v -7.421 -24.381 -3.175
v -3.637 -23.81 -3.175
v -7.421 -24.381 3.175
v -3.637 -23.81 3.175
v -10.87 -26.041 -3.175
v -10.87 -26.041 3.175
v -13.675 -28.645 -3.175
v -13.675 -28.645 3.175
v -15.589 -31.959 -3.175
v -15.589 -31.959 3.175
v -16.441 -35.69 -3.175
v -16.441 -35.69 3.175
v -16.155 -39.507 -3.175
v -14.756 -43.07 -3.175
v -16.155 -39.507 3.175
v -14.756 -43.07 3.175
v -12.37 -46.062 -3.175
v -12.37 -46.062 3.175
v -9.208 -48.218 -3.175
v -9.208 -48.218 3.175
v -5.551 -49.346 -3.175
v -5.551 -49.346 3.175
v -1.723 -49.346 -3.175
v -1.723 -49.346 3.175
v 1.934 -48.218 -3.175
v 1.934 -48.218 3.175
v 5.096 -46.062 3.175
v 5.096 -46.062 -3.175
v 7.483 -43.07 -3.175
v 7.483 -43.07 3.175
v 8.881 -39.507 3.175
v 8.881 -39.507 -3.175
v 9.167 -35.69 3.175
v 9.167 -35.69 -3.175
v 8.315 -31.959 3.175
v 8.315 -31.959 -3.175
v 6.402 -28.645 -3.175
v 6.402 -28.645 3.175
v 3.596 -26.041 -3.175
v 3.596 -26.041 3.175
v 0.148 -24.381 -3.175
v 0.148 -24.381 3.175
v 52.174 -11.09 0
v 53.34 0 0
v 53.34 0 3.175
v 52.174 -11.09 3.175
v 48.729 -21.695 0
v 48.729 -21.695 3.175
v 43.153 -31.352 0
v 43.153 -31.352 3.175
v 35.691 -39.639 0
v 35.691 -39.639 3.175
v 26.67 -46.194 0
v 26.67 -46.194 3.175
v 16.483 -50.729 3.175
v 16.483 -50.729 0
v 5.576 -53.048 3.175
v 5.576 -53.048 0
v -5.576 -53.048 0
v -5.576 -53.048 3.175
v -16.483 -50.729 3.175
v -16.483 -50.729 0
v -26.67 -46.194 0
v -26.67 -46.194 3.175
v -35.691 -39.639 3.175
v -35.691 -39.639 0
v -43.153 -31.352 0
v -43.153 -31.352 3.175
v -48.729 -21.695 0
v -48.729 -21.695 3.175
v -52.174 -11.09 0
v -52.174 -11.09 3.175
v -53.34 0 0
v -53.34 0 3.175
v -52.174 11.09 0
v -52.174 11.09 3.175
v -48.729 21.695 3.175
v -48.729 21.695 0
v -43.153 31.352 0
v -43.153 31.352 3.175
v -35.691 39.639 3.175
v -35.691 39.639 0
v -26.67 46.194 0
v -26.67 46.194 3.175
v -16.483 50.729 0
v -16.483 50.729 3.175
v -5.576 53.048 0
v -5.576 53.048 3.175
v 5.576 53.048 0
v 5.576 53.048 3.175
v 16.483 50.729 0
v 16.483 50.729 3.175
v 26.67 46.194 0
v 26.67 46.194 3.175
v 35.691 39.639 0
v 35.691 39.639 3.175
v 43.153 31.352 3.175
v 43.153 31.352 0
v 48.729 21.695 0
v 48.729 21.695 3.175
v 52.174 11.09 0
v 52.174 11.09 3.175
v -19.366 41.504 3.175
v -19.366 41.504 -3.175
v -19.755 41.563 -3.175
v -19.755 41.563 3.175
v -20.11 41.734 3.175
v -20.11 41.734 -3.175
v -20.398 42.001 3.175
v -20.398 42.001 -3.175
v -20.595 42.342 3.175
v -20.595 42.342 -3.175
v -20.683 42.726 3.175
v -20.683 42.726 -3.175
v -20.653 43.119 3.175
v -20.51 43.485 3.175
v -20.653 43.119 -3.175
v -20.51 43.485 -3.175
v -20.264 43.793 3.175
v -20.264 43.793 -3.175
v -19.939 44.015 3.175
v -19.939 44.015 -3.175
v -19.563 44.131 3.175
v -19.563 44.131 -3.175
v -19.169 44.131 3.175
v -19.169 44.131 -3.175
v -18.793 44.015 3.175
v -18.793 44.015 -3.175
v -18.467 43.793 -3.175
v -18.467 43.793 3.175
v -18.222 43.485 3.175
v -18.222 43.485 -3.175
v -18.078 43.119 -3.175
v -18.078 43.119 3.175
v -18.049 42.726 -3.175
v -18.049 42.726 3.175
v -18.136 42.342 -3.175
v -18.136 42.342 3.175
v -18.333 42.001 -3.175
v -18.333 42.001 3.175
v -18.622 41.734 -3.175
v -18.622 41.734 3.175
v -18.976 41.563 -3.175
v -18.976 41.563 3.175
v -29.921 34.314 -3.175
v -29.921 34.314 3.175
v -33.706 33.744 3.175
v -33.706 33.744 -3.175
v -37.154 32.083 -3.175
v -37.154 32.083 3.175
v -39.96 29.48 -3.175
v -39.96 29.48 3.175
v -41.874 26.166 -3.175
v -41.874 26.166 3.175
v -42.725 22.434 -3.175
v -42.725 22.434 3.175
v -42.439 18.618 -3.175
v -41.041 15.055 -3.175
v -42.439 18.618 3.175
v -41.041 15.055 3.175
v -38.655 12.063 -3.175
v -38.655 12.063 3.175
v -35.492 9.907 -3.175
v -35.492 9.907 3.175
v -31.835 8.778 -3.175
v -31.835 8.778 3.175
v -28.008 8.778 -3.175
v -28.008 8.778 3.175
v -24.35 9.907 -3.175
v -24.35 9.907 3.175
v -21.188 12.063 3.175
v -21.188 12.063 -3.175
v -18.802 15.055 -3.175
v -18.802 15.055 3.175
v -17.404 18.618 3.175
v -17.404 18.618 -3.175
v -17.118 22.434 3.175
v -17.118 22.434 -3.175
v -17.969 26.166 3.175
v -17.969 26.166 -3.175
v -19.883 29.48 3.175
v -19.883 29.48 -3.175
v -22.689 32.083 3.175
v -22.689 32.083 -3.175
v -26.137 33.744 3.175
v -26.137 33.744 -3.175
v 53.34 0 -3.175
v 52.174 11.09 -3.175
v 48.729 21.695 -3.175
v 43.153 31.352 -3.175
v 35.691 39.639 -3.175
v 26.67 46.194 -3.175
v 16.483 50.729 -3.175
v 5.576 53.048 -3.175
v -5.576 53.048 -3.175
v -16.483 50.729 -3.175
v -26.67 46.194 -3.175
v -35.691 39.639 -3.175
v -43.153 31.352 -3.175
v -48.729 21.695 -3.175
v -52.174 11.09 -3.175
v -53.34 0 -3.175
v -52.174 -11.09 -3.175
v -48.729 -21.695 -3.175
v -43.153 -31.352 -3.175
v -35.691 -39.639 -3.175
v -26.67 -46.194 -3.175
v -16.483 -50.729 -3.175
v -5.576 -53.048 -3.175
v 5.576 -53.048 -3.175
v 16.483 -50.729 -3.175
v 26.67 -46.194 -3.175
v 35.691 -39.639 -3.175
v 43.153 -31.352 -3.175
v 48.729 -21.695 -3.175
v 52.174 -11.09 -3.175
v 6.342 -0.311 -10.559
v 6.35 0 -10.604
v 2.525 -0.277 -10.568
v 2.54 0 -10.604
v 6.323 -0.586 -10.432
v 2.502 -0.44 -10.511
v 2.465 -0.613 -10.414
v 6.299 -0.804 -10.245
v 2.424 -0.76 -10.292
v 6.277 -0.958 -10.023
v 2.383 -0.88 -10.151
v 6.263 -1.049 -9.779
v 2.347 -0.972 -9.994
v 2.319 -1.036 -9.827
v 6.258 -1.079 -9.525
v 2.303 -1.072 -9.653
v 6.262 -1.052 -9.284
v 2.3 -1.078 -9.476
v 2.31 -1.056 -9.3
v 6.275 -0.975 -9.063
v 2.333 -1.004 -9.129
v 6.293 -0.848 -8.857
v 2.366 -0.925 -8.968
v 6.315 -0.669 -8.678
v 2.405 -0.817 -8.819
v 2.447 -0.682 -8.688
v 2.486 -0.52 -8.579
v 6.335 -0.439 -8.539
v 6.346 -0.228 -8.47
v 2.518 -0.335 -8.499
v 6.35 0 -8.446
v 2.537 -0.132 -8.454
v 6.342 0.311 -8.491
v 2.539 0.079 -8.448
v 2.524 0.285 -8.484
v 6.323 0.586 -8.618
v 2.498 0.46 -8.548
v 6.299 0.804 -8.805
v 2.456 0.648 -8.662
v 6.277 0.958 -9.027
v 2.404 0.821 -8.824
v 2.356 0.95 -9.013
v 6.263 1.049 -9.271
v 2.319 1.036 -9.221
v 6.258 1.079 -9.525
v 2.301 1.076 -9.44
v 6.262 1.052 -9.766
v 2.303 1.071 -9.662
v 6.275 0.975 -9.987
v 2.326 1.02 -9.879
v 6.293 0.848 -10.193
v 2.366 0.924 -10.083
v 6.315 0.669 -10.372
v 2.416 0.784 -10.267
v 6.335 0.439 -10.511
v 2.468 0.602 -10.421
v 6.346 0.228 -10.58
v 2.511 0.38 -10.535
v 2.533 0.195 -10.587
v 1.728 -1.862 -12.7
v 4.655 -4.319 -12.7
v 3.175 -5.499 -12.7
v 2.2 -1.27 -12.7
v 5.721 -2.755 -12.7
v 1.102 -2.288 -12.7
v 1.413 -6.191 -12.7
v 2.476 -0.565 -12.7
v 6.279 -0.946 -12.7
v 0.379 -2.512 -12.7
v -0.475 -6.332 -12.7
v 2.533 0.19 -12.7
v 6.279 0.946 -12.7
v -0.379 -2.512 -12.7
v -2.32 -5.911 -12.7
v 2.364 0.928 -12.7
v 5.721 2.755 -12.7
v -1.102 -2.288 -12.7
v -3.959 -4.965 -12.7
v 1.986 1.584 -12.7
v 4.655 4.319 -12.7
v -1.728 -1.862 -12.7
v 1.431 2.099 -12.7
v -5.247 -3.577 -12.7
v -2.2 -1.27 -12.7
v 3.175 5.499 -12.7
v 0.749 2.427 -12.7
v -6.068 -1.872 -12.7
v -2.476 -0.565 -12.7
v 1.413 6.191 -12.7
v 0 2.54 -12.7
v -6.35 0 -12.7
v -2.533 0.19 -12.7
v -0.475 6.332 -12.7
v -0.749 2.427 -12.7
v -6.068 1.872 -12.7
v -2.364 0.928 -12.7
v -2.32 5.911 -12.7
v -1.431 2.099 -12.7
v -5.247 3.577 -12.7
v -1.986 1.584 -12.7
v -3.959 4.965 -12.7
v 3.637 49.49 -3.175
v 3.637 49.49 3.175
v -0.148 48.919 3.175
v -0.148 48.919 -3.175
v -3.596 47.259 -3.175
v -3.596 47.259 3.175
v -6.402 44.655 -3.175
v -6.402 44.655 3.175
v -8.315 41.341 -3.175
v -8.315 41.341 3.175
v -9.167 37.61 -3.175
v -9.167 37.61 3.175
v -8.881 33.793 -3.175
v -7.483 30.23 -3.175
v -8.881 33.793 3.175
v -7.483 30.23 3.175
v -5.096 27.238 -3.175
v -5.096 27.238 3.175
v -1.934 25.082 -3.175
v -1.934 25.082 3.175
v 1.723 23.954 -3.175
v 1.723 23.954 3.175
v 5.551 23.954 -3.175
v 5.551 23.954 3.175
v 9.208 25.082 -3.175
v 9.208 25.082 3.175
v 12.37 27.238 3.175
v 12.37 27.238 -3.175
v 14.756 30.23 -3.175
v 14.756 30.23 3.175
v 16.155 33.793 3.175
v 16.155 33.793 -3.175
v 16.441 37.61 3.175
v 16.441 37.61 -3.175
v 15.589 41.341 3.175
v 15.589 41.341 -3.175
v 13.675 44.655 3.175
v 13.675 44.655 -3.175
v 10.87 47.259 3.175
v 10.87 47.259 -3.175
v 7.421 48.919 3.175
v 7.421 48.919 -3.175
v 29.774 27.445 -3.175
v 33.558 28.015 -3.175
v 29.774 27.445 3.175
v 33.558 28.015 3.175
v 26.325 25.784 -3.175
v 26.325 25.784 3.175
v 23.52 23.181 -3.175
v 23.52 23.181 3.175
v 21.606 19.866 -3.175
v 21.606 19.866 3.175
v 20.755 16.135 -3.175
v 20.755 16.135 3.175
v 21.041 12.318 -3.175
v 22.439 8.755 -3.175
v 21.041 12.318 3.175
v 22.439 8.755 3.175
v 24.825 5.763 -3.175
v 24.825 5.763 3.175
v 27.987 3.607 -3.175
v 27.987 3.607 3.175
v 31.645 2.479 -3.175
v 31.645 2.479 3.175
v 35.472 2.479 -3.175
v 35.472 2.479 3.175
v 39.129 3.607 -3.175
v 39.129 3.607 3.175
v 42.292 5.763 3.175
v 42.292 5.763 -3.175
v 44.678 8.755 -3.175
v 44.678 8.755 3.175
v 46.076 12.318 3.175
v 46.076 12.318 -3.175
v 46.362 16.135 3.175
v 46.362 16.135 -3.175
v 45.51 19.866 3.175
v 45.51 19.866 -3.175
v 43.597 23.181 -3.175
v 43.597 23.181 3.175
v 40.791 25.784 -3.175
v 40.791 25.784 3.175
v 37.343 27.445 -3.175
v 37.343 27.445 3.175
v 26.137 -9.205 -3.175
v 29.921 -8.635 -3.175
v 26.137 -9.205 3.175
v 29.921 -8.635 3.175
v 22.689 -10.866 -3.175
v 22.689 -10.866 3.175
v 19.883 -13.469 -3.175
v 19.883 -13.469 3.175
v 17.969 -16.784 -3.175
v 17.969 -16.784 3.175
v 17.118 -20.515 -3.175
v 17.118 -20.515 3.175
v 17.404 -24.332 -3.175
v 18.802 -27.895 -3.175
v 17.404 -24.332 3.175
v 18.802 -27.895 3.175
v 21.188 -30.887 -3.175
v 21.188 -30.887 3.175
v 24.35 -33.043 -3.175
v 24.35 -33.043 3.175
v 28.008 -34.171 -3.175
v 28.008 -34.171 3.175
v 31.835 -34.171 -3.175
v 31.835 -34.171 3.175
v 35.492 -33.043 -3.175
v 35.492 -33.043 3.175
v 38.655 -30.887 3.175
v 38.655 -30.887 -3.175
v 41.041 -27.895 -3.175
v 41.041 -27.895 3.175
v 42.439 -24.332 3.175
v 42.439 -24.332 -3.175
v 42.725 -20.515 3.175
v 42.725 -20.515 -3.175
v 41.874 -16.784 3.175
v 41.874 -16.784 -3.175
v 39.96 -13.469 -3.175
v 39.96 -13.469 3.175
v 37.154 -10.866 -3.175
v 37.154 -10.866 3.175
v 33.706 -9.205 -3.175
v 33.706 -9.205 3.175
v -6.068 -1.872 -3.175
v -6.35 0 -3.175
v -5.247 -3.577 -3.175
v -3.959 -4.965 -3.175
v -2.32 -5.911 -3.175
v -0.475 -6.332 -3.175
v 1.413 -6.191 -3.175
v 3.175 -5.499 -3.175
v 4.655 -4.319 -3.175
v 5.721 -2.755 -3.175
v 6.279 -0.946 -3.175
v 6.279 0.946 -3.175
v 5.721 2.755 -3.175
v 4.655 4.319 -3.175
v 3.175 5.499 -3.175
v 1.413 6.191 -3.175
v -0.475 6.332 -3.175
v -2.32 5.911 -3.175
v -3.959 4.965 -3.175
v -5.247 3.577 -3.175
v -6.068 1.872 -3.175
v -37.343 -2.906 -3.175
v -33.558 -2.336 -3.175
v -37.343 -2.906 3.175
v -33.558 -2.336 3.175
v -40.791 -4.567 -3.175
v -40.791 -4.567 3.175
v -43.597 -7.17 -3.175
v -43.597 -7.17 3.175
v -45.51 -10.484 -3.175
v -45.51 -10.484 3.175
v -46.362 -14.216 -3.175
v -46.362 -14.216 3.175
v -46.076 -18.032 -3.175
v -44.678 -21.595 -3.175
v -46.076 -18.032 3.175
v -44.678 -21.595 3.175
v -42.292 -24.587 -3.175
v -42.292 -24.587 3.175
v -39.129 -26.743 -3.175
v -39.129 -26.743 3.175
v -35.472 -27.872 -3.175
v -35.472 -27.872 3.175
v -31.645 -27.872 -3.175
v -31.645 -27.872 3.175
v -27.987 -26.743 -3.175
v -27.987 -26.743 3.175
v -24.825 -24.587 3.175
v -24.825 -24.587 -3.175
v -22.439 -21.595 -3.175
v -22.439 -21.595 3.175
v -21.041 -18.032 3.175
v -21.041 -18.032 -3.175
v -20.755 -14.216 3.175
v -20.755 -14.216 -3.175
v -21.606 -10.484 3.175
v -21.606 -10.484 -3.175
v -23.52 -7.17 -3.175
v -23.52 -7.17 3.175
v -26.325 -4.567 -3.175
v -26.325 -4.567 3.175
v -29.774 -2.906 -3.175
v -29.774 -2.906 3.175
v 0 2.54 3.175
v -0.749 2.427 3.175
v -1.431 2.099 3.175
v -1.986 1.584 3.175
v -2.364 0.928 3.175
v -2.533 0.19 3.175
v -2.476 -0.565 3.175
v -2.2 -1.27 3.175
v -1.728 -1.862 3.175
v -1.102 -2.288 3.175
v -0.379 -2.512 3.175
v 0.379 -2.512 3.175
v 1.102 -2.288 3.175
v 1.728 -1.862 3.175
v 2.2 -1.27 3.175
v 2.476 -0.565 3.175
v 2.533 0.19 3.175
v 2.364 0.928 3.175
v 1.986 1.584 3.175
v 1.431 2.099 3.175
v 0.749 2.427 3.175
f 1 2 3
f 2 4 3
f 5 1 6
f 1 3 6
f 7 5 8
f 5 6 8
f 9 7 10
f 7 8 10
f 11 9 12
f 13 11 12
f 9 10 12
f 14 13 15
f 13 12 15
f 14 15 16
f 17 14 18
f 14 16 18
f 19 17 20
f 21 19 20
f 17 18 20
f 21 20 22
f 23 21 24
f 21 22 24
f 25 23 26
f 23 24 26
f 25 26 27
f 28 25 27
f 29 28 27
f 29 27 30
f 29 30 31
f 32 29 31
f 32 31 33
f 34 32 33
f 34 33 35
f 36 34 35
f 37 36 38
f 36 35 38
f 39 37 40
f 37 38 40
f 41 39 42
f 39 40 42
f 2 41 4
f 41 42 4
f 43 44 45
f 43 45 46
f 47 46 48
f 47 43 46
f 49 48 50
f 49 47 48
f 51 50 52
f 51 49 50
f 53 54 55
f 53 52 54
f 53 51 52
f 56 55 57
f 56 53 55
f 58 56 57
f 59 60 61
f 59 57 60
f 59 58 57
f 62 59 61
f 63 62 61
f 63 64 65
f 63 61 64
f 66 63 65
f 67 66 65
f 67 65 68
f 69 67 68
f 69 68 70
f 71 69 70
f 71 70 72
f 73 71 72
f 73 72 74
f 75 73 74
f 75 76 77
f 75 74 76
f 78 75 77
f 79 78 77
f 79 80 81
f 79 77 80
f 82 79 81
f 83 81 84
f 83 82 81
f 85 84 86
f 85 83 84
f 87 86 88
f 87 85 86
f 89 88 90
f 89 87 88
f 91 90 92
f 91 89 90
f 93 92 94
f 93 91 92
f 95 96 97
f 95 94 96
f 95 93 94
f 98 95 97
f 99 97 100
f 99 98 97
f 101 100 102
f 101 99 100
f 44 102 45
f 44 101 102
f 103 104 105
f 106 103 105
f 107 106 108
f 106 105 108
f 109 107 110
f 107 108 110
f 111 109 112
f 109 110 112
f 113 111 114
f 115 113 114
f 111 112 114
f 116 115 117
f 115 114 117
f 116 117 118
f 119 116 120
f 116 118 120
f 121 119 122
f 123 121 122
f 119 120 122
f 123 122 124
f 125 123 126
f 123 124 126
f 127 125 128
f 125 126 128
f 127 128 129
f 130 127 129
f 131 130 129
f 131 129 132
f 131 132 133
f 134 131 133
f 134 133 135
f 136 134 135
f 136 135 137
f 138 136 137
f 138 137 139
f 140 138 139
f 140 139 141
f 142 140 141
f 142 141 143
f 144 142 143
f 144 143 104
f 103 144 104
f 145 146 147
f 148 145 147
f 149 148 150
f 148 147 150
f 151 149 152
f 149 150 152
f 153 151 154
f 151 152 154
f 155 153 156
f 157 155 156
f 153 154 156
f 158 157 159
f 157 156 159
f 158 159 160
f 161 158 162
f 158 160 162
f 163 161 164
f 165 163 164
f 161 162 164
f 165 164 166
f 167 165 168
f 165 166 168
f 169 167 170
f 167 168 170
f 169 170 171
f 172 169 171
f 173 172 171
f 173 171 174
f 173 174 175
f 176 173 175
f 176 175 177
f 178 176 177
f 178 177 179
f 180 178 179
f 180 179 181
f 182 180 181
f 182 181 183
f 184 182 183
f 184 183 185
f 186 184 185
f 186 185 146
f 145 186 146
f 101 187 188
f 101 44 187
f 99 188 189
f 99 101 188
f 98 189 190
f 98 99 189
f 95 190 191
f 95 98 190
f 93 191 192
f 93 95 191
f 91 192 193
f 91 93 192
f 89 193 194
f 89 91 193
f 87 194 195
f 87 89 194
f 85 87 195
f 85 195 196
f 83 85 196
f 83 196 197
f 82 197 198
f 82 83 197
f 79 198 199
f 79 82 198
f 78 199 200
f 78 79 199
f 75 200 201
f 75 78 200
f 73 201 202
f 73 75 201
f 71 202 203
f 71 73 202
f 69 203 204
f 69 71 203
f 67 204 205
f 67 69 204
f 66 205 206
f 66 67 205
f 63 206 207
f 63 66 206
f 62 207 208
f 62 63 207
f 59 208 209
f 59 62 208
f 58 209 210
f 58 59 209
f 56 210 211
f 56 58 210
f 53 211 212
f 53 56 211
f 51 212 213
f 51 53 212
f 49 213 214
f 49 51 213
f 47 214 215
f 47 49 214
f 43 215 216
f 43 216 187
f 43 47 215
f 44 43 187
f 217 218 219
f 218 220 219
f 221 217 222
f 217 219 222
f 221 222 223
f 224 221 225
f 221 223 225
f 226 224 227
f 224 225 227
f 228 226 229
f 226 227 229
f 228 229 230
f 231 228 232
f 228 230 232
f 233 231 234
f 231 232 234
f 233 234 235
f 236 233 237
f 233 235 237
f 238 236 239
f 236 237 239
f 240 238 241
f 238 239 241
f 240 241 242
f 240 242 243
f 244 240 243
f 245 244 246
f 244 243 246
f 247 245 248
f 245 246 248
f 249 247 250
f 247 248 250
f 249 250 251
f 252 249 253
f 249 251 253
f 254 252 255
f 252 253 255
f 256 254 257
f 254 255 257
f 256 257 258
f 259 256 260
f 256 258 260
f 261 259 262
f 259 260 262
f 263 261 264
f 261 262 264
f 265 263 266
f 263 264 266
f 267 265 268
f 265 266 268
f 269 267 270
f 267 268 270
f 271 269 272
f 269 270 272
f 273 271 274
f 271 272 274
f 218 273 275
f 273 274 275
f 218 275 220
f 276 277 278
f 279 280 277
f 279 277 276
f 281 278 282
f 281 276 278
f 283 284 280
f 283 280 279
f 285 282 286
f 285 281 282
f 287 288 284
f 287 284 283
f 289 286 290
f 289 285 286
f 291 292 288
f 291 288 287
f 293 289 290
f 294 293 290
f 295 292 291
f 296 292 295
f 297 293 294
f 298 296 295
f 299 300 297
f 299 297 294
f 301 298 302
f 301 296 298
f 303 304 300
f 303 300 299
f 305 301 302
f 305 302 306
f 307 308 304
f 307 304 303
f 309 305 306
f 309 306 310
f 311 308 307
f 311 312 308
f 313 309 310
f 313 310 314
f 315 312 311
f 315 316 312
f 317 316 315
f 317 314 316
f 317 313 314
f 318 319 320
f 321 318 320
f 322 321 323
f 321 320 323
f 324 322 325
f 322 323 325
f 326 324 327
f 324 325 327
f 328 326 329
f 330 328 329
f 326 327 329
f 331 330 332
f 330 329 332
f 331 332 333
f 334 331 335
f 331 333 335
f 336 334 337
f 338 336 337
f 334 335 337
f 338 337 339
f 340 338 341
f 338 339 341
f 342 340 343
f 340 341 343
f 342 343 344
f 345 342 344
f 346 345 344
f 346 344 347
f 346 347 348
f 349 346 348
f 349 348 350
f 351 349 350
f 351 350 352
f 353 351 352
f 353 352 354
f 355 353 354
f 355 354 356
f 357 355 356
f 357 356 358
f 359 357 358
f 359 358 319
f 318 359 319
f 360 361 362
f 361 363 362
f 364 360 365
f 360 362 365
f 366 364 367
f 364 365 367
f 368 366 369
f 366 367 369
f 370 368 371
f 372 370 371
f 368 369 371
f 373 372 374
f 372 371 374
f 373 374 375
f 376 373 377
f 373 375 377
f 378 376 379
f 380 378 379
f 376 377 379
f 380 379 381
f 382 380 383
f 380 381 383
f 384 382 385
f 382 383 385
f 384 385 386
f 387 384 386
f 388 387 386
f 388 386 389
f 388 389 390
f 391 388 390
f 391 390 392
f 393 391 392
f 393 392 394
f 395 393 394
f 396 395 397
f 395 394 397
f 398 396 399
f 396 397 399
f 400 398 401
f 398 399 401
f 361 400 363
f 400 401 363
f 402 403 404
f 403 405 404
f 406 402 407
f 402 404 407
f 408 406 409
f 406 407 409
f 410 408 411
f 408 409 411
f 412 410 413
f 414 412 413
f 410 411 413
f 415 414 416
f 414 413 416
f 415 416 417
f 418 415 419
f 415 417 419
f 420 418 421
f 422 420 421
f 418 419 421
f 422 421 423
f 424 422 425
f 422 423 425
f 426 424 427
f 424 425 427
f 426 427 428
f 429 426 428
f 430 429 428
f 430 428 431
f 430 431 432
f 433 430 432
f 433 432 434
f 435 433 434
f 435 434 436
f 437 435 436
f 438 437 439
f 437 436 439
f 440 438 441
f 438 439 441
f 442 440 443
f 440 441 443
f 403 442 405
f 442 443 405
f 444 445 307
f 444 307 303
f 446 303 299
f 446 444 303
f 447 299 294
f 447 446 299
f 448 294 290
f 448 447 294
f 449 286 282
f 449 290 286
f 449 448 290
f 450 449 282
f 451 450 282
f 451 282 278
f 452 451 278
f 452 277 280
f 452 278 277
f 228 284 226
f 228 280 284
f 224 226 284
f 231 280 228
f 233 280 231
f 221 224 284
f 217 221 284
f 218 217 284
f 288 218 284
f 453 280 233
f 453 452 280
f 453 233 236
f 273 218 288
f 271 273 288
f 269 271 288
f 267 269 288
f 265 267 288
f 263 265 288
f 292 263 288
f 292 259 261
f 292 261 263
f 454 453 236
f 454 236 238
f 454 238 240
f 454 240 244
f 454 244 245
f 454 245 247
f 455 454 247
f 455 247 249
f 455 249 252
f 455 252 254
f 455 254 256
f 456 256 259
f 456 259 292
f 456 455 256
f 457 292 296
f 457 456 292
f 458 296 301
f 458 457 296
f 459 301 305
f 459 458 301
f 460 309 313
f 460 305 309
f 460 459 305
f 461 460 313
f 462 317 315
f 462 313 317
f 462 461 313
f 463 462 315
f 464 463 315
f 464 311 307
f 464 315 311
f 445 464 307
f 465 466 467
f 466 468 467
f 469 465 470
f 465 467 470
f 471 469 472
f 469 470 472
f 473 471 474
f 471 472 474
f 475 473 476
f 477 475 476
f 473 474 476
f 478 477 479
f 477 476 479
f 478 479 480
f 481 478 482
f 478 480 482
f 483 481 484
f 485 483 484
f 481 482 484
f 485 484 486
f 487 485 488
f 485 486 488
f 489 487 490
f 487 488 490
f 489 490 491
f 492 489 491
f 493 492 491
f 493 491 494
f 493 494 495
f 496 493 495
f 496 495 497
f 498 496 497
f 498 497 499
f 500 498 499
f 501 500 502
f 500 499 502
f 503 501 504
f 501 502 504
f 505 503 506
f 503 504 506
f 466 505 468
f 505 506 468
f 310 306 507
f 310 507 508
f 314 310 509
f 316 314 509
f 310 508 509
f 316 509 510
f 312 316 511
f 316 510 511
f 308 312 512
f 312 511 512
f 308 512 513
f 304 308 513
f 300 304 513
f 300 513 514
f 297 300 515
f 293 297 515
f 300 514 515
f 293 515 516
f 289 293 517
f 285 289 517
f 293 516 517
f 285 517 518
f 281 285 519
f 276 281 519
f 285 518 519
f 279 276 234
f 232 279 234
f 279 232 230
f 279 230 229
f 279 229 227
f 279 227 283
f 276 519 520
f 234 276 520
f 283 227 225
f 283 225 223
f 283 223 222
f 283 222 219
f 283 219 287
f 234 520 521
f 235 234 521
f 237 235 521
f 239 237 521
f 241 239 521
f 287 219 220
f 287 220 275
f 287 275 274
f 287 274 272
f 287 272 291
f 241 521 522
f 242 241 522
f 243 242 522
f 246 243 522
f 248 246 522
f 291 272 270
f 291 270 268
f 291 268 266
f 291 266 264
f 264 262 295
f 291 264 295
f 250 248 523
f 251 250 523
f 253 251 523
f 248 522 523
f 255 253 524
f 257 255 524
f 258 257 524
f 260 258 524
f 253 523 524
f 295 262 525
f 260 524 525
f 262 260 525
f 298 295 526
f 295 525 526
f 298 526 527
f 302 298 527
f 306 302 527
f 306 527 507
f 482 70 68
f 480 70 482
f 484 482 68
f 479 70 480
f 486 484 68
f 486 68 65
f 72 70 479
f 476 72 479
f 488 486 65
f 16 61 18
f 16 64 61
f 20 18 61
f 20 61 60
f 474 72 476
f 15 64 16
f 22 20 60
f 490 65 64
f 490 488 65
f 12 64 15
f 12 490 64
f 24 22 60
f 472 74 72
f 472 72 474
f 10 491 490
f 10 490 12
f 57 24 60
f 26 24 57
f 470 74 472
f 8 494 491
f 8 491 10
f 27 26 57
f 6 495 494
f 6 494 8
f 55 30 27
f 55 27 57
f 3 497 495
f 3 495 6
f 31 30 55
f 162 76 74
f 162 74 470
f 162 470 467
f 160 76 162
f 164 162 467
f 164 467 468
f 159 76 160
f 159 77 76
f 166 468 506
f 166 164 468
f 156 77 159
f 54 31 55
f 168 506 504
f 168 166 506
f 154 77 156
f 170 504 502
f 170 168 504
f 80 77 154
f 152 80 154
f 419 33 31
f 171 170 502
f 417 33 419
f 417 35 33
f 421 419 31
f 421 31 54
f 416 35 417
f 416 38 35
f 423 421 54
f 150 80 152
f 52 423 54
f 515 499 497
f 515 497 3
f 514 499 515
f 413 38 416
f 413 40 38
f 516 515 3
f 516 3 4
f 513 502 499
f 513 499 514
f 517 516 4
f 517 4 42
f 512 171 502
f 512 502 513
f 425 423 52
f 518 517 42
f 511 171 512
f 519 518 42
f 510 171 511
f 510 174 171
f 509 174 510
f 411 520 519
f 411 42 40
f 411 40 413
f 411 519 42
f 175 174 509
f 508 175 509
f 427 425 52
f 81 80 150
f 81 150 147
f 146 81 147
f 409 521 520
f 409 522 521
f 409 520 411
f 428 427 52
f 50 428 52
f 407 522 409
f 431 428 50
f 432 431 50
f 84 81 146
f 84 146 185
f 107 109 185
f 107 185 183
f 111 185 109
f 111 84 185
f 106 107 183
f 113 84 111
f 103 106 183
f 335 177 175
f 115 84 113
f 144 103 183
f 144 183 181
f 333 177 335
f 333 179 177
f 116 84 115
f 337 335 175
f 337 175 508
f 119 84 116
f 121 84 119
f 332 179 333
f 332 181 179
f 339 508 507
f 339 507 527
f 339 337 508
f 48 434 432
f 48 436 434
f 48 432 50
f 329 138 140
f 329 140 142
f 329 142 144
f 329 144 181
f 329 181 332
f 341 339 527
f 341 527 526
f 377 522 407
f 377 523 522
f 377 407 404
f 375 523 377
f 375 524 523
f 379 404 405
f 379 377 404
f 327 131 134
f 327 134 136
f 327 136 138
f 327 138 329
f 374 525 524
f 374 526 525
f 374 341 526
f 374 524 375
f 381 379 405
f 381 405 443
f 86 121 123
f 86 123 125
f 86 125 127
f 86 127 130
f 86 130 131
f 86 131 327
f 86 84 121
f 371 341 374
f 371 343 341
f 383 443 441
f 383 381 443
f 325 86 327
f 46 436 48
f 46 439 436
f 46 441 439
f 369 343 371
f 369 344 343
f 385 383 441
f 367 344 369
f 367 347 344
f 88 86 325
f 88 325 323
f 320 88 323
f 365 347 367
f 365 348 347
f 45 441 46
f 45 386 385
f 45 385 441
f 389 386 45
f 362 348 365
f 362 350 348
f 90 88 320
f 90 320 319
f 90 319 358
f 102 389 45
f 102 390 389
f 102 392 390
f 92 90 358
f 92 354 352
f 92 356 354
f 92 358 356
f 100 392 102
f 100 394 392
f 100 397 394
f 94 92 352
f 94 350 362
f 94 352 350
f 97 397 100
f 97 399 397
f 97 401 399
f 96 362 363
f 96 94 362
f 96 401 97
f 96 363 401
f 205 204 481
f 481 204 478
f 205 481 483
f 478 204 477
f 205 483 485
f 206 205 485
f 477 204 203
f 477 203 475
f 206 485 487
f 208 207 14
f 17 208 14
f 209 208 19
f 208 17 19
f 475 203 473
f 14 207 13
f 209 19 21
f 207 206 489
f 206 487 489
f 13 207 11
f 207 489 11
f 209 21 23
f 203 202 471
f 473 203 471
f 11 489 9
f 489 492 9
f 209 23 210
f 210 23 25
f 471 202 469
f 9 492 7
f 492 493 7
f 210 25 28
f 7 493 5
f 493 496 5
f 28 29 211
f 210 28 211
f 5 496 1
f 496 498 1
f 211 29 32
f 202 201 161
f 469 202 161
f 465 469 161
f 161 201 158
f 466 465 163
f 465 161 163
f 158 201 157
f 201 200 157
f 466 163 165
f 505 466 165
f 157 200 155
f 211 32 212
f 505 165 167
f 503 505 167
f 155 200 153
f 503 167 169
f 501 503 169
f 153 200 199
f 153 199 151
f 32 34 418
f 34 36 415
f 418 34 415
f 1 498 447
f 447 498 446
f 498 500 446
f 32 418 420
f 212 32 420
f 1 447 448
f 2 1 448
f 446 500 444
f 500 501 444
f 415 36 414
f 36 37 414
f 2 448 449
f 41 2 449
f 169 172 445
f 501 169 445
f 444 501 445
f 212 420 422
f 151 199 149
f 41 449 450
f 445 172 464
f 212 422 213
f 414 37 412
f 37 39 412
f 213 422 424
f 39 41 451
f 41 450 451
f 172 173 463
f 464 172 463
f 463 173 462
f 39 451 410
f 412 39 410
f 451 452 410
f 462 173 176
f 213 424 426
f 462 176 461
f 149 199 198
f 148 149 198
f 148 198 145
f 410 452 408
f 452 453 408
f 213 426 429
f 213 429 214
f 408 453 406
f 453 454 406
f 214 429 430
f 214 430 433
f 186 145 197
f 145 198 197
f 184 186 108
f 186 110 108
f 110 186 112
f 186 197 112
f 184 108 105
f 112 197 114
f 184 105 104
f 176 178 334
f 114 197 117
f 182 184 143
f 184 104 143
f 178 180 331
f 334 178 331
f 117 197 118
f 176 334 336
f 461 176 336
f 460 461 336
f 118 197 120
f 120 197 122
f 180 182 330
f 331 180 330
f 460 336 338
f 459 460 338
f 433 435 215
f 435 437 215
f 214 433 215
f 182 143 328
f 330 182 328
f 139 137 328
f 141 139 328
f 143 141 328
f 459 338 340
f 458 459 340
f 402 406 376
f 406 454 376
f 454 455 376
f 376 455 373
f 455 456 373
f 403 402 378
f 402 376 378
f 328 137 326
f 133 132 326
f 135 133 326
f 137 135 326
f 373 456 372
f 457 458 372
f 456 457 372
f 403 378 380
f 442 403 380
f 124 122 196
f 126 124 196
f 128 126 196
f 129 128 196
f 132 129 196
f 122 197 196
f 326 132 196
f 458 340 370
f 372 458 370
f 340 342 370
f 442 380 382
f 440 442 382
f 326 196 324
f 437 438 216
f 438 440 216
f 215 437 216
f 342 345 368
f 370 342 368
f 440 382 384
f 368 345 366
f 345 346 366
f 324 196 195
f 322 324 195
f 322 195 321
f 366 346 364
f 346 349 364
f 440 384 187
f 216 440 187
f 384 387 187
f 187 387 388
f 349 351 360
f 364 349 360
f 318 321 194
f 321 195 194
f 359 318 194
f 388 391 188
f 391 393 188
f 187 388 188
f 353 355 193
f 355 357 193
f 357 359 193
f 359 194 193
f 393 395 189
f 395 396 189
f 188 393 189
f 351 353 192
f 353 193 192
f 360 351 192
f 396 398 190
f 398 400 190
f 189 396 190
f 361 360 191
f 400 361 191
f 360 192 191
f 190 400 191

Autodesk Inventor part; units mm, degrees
ref_plane "XZ Plane" through (0, 0, 0) normal (0, 1, 0) x (-1, 0, 0)
ref_plane "XY Plane" through (0, 0, 0) normal (0, 0, 1) x (1, 0, 0)
sketch "Sketch1" plane through (0, 0, 0) normal (0, 0, 1) x (1, 0, 0)
  circle A0 centre (0, 0) radius 53.34
  dimension "d0" = 106.68
extrude "Extrusion1" add sketch "Sketch1" along normal mid plane 6.35
sketch "Sketch2" plane through (0, 0, -3.175) normal (0, 0, -1) x (-1, 0, 0)
  point P0 (0, 0)
sketch "Sketch3" plane through (0, 0, -3.175) normal (0, 0, -1) x (-1, 0, 0)
  line L0 (29.9214, 21.4747) -> (33.5583, -15.1753)
  line L1 (33.5583, -15.1753) -> (3.6369, -36.65)
  line L2 (3.6369, -36.65) -> (-29.9214, -21.4747)
  line L3 (-29.9214, -21.4747) -> (-33.5583, 15.1753)
  line L4 (-33.5583, 15.1753) -> (-3.6369, 36.65)
  line L5 (-3.6369, 36.65) -> (29.9214, 21.4747)
  point P0 (0, 0)
  point P1 (0, 0)
  dimension "d3" = 36.83
hole "Hole1" at (33.5583, 15.1753, -3.175) at (3.6369, 36.65, -3.175) at (-29.9214, 21.4747, -3.175) at (-33.5583, -15.1753, -3.175) at (-3.6369, -36.65, -3.175) at (29.9214, -21.4747, -3.175) direction (0, 0, 1) diameter 25.6794 end through all
sketch "Sketch4" plane through (0, 0, -3.175) normal (0, 0, -1) x (-1, 0, 0)
  circle A0 centre (0, 0) radius 6.35
  dimension "d11" = 12.7
extrude "Extrusion2" add sketch "Sketch4" along normal blind 9.525
sketch "Sketch5" plane through (0, 0, -12.7) normal (0, 0, -1) x (-1, 0, 0)
  circle A0 centre (0, 0) radius 6.35 projected
hole "Hole2" at (0, 0, -12.7) direction (0, 0, 1) diameter 5.08 end through all
ref_plane "Work Plane1" through (6.35, 0, 0) normal (1, 0, 0) x (0, 1, 0)
sketch "Sketch6" plane through (6.35, 0, 0) normal (1, 0, 0) x (0, 1, 0)
  line L0 (-6.35, -12.7) -> (6.35, -12.7) projected
  point P0 (0, 0)
  point P1 (0, -9.525)
  dimension "d22" = 3.175
hole "Hole3" at (6.35, 0, -9.525) direction (-1, 0, 0) diameter 2.159 depth 6.35 tip angle 118
sketch "Sketch7" plane through (0, 0, 3.175) normal (0, 0, 1) x (1, 0, 0)
  circle A0 centre (0, 0) radius 2.54 projected
  line L0 (0, 0) -> (-21.9781, 48.6017)
  circle A1 centre (0, 0) radius 53.34 projected
  circle A2 centre (-29.9214, 21.4747) radius 12.8397 projected
  line L1 (-29.9214, 21.4747) -> (3.4827, 36.5803)
  line L2 (3.4827, 36.5803) -> (3.4827, 23.8112)
  circle A3 centre (3.6369, 36.65) radius 12.8397 projected
  line L3 (3.4827, 36.5803) -> (-8.5593, 40.6638)
  line L4 (-21.9781, 48.6017) -> (-19.3657, 42.8249)
  dimension "d30" = 12.7155
  dimension "d31" = 5.5753
hole "Hole4" at (-19.3657, 42.8249, 3.175) direction (0, 0, -1) diameter 2.6416 end through all thread size "6-32 UNC" class "2B" standard "ANSI Unified Screw Threads"
properties part number "threaded filter wheel"
